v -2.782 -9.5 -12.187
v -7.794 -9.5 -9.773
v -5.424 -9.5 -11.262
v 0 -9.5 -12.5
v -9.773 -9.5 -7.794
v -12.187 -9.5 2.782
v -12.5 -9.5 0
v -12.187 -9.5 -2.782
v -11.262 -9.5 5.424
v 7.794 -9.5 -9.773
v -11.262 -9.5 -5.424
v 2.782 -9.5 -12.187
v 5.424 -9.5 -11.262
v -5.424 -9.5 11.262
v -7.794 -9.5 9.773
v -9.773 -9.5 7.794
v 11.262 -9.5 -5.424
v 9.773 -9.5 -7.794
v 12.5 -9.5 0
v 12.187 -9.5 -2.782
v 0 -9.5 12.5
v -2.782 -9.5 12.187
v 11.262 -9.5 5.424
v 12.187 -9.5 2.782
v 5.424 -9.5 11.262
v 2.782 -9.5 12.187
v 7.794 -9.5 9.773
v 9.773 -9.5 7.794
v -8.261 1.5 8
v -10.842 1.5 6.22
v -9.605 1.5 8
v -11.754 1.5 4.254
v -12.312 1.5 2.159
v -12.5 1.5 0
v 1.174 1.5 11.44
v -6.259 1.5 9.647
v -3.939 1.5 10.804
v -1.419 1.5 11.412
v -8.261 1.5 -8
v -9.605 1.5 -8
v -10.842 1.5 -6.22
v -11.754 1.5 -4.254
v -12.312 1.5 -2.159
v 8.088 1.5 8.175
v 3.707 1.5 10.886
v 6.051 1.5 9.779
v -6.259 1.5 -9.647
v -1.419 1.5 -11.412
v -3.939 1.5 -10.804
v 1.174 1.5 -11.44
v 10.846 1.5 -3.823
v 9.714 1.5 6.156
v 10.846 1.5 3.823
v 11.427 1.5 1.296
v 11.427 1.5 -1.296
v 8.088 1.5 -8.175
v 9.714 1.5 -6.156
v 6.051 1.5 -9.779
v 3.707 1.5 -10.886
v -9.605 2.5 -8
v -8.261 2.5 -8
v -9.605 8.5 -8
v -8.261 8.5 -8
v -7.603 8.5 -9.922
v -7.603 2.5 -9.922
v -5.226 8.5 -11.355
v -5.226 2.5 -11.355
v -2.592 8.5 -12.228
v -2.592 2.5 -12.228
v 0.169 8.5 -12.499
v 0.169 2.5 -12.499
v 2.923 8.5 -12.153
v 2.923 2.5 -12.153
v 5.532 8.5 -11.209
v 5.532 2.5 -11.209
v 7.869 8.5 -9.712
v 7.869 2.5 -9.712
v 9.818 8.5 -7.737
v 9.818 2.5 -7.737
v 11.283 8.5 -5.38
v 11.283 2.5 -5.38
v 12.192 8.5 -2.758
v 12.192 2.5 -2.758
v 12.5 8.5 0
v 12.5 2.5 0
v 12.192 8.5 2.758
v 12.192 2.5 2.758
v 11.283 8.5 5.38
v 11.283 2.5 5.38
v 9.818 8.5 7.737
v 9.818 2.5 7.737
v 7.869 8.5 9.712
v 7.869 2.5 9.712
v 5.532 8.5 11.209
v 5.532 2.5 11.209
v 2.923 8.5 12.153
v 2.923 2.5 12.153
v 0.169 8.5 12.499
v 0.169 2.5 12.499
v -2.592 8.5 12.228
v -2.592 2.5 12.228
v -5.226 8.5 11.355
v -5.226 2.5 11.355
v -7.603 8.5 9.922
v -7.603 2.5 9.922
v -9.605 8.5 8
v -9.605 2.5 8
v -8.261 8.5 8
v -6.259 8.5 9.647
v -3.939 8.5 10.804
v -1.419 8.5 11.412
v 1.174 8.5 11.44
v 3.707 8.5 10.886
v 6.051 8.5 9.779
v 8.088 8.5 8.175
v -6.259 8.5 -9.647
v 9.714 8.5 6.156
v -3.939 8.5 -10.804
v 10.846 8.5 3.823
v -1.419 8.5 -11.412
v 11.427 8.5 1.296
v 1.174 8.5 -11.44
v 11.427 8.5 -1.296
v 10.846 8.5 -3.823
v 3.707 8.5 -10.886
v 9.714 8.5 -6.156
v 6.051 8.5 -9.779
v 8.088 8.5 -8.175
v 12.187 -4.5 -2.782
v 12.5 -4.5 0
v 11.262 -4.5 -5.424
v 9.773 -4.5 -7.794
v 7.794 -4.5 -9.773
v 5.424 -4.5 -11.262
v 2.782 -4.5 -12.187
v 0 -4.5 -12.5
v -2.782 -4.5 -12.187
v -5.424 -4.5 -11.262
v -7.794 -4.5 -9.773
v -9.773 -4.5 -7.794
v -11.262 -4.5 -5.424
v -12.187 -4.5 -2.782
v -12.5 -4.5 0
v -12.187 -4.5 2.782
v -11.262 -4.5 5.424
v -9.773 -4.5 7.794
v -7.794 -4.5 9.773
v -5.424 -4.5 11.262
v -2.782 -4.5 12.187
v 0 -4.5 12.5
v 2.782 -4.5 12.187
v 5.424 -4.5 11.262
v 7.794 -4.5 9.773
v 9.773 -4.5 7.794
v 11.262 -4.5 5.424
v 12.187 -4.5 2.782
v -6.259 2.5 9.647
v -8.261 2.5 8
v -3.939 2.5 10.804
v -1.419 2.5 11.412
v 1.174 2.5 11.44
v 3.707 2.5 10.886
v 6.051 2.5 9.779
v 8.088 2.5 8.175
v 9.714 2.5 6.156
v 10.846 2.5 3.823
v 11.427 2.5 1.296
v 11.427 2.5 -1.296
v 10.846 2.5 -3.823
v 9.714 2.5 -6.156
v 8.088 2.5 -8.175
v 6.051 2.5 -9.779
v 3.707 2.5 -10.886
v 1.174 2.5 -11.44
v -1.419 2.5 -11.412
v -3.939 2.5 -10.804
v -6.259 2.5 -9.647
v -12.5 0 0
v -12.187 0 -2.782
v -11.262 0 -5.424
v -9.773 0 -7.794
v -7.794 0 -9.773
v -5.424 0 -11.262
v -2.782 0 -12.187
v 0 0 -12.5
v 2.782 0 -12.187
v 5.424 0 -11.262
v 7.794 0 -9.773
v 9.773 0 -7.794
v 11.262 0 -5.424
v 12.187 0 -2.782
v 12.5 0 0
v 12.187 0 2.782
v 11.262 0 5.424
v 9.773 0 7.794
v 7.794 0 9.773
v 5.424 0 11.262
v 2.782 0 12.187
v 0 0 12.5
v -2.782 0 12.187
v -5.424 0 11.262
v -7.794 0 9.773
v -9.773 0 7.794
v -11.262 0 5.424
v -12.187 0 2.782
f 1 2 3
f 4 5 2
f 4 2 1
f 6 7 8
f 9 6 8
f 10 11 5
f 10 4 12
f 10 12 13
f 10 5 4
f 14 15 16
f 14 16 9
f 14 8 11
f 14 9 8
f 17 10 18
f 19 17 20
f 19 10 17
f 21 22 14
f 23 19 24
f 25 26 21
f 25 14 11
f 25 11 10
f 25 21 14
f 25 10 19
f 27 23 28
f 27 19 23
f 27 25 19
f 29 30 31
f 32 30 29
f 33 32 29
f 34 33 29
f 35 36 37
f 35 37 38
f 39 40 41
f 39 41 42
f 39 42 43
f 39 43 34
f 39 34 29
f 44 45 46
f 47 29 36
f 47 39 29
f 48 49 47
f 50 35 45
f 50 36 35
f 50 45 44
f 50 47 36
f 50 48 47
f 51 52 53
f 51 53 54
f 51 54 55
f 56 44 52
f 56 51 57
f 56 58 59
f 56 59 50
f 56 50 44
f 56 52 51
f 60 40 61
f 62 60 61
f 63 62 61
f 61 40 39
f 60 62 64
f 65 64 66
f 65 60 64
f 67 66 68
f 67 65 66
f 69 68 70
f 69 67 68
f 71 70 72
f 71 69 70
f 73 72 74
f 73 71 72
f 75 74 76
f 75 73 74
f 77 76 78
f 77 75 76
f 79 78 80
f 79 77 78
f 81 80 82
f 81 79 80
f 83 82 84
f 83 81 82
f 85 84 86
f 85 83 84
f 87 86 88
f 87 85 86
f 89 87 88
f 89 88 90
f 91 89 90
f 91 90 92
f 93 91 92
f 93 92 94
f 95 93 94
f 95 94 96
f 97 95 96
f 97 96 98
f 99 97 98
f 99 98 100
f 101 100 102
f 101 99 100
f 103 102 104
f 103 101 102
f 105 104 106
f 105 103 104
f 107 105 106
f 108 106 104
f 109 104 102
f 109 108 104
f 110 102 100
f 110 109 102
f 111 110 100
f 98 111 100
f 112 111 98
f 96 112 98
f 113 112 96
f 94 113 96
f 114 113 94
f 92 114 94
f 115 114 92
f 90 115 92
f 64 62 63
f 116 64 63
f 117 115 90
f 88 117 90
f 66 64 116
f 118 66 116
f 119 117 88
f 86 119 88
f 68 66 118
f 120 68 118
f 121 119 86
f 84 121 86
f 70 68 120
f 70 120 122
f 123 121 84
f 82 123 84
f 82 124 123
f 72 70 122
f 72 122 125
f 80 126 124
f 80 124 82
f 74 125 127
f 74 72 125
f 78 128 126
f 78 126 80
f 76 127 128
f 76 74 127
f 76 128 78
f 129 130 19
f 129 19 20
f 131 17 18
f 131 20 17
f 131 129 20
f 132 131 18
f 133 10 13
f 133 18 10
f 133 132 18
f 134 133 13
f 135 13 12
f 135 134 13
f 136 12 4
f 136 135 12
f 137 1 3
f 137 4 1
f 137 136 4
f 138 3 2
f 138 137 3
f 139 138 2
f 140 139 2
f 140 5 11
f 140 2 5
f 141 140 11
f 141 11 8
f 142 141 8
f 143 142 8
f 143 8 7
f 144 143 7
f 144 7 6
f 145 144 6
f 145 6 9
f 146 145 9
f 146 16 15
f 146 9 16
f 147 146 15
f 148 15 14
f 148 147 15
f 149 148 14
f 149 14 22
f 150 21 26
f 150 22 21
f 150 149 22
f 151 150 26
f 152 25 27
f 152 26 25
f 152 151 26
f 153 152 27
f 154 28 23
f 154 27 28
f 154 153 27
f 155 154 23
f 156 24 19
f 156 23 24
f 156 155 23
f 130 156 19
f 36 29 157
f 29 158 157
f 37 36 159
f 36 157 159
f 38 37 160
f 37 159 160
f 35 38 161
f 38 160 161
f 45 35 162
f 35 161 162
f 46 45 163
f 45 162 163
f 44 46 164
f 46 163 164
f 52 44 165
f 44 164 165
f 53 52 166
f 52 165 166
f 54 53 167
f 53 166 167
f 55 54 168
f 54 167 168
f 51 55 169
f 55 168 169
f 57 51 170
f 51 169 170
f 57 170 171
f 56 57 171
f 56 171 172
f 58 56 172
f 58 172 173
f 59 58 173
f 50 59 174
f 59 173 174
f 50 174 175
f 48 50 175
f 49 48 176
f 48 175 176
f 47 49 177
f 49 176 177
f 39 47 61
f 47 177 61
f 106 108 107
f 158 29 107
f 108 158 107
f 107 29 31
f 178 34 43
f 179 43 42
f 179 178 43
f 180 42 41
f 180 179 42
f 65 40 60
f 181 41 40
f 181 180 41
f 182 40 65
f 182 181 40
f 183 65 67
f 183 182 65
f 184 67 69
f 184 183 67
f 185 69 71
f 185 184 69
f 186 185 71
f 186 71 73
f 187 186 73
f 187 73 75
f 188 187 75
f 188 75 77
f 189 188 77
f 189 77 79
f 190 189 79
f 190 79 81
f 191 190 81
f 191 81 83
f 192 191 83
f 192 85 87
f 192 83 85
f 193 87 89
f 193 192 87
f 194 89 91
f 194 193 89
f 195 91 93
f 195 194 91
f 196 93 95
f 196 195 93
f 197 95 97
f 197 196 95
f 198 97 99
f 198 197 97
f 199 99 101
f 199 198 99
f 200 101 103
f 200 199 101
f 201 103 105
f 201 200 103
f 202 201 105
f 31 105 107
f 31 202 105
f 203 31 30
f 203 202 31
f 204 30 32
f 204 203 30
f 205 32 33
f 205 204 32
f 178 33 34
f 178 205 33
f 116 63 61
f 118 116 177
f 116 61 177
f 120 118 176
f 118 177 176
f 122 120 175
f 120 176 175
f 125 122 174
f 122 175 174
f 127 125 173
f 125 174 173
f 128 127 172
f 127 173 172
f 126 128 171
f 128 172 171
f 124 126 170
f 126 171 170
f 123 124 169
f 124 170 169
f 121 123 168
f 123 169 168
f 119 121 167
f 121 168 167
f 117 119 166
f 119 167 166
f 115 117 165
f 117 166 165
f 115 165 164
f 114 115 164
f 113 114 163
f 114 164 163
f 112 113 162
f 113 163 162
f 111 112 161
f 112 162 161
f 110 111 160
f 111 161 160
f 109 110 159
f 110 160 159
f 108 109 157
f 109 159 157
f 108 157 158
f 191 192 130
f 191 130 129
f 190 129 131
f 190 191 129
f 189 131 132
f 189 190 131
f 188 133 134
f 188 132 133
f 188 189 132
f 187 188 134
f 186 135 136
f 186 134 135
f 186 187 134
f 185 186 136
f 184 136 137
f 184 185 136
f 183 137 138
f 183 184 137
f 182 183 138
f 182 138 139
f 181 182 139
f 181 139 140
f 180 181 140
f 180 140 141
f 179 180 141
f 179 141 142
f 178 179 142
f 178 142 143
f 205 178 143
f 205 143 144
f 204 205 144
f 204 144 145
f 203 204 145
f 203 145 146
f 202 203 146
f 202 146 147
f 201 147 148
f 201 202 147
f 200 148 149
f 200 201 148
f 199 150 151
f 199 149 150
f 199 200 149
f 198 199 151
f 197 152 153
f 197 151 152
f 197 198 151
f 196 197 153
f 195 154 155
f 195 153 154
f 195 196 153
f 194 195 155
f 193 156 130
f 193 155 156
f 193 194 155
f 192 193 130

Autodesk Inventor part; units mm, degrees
ref_plane "YZ Plane" through (0, 0, 0) normal (1, 0, 0) x (0, 1, 0)
ref_plane "XZ Plane" through (0, 0, 0) normal (0, 1, 0) x (-1, 0, 0)
ref_plane "XY Plane" through (0, 0, 0) normal (0, 0, 1) x (1, 0, 0)
sketch "Sketch1" plane through (0, 0, 0) normal (0, 1, 0) x (-1, 0, 0)
  circle A0 centre (0, 0) radius 12.5
  dimension "d0" = 25
extrude "Extrusion1" add sketch "Sketch1" along normal blind 2.5
sketch "Sketch2" plane through (0, 2.5, 0) normal (0, 1, 0) x (1, 0, 0)
  circle A0 centre (0, 0) radius 11.5
  dimension "d3" = 23
extrude "Extrusion2" cut sketch "Sketch2" against normal blind 1
sketch "Sketch3" plane through (0, 2.5, 0) normal (0, 1, 0) x (1, 0, 0)
  circle A0 centre (0, 0) radius 11.5 projected
  circle A1 centre (0, 0) radius 12.5 projected
  line L0 (-8.2614, -8) -> (-9.6047, -8)
  line L1 (-8.2614, 8) -> (-9.6047, 8)
extrude "Extrusion3" cut sketch "Sketch3" against normal up to surface (1 mm away) contours A0 L0 A1 L1 picked at (-11.7871, 0)
sketch "Sketch6" plane through (0, 2.5, 0) normal (0, 1, 0) x (1, 0, 0)
  arc A0 (-9.6047, -8) -> (-9.6047, 8) centre (0, 0) ccw projected
  arc A1 (-8.2614, -8) -> (-8.2614, 8) centre (0, 0) ccw projected
  line L0 (-9.6047, 8) -> (-8.2614, 8) projected
  line L1 (-8.2614, -8) -> (-9.6047, -8) projected
extrude "Extrusion5" add sketch "Sketch6" along normal blind 1
sketch "Sketch7" plane through (0, 3.5, 0) normal (0, 1, 0) x (1, 0, 0)
  arc A0 (-8.2614, -8) -> (-8.2614, 8) centre (0, 0) ccw projected
  line L0 (-9.6047, 8) -> (-8.2614, 8) projected
  line L1 (-8.2614, -8) -> (-9.6047, -8) projected
  arc A1 (-9.6047, -8) -> (-9.6047, 8) centre (0, 0) ccw projected
extrude "Extrusion6" add sketch "Sketch7" along normal blind 5
sketch "Sketch8" plane through (0, 0, 0) normal (0, -1, 0) x (1, 0, 0)
  circle A0 centre (0, 0) radius 12.5 projected
extrude "Extrusion7" add sketch "Sketch8" along normal blind 4.5
sketch "Sketch9" plane through (0, -4.5, 0) normal (0, -1, 0) x (1, 0, 0)
  circle A0 centre (0, 0) radius 12.5 projected
extrude "Extrusion8" add sketch "Sketch9" along normal blind 5
properties part number "Heis_kopp" material "S355J2+N"
